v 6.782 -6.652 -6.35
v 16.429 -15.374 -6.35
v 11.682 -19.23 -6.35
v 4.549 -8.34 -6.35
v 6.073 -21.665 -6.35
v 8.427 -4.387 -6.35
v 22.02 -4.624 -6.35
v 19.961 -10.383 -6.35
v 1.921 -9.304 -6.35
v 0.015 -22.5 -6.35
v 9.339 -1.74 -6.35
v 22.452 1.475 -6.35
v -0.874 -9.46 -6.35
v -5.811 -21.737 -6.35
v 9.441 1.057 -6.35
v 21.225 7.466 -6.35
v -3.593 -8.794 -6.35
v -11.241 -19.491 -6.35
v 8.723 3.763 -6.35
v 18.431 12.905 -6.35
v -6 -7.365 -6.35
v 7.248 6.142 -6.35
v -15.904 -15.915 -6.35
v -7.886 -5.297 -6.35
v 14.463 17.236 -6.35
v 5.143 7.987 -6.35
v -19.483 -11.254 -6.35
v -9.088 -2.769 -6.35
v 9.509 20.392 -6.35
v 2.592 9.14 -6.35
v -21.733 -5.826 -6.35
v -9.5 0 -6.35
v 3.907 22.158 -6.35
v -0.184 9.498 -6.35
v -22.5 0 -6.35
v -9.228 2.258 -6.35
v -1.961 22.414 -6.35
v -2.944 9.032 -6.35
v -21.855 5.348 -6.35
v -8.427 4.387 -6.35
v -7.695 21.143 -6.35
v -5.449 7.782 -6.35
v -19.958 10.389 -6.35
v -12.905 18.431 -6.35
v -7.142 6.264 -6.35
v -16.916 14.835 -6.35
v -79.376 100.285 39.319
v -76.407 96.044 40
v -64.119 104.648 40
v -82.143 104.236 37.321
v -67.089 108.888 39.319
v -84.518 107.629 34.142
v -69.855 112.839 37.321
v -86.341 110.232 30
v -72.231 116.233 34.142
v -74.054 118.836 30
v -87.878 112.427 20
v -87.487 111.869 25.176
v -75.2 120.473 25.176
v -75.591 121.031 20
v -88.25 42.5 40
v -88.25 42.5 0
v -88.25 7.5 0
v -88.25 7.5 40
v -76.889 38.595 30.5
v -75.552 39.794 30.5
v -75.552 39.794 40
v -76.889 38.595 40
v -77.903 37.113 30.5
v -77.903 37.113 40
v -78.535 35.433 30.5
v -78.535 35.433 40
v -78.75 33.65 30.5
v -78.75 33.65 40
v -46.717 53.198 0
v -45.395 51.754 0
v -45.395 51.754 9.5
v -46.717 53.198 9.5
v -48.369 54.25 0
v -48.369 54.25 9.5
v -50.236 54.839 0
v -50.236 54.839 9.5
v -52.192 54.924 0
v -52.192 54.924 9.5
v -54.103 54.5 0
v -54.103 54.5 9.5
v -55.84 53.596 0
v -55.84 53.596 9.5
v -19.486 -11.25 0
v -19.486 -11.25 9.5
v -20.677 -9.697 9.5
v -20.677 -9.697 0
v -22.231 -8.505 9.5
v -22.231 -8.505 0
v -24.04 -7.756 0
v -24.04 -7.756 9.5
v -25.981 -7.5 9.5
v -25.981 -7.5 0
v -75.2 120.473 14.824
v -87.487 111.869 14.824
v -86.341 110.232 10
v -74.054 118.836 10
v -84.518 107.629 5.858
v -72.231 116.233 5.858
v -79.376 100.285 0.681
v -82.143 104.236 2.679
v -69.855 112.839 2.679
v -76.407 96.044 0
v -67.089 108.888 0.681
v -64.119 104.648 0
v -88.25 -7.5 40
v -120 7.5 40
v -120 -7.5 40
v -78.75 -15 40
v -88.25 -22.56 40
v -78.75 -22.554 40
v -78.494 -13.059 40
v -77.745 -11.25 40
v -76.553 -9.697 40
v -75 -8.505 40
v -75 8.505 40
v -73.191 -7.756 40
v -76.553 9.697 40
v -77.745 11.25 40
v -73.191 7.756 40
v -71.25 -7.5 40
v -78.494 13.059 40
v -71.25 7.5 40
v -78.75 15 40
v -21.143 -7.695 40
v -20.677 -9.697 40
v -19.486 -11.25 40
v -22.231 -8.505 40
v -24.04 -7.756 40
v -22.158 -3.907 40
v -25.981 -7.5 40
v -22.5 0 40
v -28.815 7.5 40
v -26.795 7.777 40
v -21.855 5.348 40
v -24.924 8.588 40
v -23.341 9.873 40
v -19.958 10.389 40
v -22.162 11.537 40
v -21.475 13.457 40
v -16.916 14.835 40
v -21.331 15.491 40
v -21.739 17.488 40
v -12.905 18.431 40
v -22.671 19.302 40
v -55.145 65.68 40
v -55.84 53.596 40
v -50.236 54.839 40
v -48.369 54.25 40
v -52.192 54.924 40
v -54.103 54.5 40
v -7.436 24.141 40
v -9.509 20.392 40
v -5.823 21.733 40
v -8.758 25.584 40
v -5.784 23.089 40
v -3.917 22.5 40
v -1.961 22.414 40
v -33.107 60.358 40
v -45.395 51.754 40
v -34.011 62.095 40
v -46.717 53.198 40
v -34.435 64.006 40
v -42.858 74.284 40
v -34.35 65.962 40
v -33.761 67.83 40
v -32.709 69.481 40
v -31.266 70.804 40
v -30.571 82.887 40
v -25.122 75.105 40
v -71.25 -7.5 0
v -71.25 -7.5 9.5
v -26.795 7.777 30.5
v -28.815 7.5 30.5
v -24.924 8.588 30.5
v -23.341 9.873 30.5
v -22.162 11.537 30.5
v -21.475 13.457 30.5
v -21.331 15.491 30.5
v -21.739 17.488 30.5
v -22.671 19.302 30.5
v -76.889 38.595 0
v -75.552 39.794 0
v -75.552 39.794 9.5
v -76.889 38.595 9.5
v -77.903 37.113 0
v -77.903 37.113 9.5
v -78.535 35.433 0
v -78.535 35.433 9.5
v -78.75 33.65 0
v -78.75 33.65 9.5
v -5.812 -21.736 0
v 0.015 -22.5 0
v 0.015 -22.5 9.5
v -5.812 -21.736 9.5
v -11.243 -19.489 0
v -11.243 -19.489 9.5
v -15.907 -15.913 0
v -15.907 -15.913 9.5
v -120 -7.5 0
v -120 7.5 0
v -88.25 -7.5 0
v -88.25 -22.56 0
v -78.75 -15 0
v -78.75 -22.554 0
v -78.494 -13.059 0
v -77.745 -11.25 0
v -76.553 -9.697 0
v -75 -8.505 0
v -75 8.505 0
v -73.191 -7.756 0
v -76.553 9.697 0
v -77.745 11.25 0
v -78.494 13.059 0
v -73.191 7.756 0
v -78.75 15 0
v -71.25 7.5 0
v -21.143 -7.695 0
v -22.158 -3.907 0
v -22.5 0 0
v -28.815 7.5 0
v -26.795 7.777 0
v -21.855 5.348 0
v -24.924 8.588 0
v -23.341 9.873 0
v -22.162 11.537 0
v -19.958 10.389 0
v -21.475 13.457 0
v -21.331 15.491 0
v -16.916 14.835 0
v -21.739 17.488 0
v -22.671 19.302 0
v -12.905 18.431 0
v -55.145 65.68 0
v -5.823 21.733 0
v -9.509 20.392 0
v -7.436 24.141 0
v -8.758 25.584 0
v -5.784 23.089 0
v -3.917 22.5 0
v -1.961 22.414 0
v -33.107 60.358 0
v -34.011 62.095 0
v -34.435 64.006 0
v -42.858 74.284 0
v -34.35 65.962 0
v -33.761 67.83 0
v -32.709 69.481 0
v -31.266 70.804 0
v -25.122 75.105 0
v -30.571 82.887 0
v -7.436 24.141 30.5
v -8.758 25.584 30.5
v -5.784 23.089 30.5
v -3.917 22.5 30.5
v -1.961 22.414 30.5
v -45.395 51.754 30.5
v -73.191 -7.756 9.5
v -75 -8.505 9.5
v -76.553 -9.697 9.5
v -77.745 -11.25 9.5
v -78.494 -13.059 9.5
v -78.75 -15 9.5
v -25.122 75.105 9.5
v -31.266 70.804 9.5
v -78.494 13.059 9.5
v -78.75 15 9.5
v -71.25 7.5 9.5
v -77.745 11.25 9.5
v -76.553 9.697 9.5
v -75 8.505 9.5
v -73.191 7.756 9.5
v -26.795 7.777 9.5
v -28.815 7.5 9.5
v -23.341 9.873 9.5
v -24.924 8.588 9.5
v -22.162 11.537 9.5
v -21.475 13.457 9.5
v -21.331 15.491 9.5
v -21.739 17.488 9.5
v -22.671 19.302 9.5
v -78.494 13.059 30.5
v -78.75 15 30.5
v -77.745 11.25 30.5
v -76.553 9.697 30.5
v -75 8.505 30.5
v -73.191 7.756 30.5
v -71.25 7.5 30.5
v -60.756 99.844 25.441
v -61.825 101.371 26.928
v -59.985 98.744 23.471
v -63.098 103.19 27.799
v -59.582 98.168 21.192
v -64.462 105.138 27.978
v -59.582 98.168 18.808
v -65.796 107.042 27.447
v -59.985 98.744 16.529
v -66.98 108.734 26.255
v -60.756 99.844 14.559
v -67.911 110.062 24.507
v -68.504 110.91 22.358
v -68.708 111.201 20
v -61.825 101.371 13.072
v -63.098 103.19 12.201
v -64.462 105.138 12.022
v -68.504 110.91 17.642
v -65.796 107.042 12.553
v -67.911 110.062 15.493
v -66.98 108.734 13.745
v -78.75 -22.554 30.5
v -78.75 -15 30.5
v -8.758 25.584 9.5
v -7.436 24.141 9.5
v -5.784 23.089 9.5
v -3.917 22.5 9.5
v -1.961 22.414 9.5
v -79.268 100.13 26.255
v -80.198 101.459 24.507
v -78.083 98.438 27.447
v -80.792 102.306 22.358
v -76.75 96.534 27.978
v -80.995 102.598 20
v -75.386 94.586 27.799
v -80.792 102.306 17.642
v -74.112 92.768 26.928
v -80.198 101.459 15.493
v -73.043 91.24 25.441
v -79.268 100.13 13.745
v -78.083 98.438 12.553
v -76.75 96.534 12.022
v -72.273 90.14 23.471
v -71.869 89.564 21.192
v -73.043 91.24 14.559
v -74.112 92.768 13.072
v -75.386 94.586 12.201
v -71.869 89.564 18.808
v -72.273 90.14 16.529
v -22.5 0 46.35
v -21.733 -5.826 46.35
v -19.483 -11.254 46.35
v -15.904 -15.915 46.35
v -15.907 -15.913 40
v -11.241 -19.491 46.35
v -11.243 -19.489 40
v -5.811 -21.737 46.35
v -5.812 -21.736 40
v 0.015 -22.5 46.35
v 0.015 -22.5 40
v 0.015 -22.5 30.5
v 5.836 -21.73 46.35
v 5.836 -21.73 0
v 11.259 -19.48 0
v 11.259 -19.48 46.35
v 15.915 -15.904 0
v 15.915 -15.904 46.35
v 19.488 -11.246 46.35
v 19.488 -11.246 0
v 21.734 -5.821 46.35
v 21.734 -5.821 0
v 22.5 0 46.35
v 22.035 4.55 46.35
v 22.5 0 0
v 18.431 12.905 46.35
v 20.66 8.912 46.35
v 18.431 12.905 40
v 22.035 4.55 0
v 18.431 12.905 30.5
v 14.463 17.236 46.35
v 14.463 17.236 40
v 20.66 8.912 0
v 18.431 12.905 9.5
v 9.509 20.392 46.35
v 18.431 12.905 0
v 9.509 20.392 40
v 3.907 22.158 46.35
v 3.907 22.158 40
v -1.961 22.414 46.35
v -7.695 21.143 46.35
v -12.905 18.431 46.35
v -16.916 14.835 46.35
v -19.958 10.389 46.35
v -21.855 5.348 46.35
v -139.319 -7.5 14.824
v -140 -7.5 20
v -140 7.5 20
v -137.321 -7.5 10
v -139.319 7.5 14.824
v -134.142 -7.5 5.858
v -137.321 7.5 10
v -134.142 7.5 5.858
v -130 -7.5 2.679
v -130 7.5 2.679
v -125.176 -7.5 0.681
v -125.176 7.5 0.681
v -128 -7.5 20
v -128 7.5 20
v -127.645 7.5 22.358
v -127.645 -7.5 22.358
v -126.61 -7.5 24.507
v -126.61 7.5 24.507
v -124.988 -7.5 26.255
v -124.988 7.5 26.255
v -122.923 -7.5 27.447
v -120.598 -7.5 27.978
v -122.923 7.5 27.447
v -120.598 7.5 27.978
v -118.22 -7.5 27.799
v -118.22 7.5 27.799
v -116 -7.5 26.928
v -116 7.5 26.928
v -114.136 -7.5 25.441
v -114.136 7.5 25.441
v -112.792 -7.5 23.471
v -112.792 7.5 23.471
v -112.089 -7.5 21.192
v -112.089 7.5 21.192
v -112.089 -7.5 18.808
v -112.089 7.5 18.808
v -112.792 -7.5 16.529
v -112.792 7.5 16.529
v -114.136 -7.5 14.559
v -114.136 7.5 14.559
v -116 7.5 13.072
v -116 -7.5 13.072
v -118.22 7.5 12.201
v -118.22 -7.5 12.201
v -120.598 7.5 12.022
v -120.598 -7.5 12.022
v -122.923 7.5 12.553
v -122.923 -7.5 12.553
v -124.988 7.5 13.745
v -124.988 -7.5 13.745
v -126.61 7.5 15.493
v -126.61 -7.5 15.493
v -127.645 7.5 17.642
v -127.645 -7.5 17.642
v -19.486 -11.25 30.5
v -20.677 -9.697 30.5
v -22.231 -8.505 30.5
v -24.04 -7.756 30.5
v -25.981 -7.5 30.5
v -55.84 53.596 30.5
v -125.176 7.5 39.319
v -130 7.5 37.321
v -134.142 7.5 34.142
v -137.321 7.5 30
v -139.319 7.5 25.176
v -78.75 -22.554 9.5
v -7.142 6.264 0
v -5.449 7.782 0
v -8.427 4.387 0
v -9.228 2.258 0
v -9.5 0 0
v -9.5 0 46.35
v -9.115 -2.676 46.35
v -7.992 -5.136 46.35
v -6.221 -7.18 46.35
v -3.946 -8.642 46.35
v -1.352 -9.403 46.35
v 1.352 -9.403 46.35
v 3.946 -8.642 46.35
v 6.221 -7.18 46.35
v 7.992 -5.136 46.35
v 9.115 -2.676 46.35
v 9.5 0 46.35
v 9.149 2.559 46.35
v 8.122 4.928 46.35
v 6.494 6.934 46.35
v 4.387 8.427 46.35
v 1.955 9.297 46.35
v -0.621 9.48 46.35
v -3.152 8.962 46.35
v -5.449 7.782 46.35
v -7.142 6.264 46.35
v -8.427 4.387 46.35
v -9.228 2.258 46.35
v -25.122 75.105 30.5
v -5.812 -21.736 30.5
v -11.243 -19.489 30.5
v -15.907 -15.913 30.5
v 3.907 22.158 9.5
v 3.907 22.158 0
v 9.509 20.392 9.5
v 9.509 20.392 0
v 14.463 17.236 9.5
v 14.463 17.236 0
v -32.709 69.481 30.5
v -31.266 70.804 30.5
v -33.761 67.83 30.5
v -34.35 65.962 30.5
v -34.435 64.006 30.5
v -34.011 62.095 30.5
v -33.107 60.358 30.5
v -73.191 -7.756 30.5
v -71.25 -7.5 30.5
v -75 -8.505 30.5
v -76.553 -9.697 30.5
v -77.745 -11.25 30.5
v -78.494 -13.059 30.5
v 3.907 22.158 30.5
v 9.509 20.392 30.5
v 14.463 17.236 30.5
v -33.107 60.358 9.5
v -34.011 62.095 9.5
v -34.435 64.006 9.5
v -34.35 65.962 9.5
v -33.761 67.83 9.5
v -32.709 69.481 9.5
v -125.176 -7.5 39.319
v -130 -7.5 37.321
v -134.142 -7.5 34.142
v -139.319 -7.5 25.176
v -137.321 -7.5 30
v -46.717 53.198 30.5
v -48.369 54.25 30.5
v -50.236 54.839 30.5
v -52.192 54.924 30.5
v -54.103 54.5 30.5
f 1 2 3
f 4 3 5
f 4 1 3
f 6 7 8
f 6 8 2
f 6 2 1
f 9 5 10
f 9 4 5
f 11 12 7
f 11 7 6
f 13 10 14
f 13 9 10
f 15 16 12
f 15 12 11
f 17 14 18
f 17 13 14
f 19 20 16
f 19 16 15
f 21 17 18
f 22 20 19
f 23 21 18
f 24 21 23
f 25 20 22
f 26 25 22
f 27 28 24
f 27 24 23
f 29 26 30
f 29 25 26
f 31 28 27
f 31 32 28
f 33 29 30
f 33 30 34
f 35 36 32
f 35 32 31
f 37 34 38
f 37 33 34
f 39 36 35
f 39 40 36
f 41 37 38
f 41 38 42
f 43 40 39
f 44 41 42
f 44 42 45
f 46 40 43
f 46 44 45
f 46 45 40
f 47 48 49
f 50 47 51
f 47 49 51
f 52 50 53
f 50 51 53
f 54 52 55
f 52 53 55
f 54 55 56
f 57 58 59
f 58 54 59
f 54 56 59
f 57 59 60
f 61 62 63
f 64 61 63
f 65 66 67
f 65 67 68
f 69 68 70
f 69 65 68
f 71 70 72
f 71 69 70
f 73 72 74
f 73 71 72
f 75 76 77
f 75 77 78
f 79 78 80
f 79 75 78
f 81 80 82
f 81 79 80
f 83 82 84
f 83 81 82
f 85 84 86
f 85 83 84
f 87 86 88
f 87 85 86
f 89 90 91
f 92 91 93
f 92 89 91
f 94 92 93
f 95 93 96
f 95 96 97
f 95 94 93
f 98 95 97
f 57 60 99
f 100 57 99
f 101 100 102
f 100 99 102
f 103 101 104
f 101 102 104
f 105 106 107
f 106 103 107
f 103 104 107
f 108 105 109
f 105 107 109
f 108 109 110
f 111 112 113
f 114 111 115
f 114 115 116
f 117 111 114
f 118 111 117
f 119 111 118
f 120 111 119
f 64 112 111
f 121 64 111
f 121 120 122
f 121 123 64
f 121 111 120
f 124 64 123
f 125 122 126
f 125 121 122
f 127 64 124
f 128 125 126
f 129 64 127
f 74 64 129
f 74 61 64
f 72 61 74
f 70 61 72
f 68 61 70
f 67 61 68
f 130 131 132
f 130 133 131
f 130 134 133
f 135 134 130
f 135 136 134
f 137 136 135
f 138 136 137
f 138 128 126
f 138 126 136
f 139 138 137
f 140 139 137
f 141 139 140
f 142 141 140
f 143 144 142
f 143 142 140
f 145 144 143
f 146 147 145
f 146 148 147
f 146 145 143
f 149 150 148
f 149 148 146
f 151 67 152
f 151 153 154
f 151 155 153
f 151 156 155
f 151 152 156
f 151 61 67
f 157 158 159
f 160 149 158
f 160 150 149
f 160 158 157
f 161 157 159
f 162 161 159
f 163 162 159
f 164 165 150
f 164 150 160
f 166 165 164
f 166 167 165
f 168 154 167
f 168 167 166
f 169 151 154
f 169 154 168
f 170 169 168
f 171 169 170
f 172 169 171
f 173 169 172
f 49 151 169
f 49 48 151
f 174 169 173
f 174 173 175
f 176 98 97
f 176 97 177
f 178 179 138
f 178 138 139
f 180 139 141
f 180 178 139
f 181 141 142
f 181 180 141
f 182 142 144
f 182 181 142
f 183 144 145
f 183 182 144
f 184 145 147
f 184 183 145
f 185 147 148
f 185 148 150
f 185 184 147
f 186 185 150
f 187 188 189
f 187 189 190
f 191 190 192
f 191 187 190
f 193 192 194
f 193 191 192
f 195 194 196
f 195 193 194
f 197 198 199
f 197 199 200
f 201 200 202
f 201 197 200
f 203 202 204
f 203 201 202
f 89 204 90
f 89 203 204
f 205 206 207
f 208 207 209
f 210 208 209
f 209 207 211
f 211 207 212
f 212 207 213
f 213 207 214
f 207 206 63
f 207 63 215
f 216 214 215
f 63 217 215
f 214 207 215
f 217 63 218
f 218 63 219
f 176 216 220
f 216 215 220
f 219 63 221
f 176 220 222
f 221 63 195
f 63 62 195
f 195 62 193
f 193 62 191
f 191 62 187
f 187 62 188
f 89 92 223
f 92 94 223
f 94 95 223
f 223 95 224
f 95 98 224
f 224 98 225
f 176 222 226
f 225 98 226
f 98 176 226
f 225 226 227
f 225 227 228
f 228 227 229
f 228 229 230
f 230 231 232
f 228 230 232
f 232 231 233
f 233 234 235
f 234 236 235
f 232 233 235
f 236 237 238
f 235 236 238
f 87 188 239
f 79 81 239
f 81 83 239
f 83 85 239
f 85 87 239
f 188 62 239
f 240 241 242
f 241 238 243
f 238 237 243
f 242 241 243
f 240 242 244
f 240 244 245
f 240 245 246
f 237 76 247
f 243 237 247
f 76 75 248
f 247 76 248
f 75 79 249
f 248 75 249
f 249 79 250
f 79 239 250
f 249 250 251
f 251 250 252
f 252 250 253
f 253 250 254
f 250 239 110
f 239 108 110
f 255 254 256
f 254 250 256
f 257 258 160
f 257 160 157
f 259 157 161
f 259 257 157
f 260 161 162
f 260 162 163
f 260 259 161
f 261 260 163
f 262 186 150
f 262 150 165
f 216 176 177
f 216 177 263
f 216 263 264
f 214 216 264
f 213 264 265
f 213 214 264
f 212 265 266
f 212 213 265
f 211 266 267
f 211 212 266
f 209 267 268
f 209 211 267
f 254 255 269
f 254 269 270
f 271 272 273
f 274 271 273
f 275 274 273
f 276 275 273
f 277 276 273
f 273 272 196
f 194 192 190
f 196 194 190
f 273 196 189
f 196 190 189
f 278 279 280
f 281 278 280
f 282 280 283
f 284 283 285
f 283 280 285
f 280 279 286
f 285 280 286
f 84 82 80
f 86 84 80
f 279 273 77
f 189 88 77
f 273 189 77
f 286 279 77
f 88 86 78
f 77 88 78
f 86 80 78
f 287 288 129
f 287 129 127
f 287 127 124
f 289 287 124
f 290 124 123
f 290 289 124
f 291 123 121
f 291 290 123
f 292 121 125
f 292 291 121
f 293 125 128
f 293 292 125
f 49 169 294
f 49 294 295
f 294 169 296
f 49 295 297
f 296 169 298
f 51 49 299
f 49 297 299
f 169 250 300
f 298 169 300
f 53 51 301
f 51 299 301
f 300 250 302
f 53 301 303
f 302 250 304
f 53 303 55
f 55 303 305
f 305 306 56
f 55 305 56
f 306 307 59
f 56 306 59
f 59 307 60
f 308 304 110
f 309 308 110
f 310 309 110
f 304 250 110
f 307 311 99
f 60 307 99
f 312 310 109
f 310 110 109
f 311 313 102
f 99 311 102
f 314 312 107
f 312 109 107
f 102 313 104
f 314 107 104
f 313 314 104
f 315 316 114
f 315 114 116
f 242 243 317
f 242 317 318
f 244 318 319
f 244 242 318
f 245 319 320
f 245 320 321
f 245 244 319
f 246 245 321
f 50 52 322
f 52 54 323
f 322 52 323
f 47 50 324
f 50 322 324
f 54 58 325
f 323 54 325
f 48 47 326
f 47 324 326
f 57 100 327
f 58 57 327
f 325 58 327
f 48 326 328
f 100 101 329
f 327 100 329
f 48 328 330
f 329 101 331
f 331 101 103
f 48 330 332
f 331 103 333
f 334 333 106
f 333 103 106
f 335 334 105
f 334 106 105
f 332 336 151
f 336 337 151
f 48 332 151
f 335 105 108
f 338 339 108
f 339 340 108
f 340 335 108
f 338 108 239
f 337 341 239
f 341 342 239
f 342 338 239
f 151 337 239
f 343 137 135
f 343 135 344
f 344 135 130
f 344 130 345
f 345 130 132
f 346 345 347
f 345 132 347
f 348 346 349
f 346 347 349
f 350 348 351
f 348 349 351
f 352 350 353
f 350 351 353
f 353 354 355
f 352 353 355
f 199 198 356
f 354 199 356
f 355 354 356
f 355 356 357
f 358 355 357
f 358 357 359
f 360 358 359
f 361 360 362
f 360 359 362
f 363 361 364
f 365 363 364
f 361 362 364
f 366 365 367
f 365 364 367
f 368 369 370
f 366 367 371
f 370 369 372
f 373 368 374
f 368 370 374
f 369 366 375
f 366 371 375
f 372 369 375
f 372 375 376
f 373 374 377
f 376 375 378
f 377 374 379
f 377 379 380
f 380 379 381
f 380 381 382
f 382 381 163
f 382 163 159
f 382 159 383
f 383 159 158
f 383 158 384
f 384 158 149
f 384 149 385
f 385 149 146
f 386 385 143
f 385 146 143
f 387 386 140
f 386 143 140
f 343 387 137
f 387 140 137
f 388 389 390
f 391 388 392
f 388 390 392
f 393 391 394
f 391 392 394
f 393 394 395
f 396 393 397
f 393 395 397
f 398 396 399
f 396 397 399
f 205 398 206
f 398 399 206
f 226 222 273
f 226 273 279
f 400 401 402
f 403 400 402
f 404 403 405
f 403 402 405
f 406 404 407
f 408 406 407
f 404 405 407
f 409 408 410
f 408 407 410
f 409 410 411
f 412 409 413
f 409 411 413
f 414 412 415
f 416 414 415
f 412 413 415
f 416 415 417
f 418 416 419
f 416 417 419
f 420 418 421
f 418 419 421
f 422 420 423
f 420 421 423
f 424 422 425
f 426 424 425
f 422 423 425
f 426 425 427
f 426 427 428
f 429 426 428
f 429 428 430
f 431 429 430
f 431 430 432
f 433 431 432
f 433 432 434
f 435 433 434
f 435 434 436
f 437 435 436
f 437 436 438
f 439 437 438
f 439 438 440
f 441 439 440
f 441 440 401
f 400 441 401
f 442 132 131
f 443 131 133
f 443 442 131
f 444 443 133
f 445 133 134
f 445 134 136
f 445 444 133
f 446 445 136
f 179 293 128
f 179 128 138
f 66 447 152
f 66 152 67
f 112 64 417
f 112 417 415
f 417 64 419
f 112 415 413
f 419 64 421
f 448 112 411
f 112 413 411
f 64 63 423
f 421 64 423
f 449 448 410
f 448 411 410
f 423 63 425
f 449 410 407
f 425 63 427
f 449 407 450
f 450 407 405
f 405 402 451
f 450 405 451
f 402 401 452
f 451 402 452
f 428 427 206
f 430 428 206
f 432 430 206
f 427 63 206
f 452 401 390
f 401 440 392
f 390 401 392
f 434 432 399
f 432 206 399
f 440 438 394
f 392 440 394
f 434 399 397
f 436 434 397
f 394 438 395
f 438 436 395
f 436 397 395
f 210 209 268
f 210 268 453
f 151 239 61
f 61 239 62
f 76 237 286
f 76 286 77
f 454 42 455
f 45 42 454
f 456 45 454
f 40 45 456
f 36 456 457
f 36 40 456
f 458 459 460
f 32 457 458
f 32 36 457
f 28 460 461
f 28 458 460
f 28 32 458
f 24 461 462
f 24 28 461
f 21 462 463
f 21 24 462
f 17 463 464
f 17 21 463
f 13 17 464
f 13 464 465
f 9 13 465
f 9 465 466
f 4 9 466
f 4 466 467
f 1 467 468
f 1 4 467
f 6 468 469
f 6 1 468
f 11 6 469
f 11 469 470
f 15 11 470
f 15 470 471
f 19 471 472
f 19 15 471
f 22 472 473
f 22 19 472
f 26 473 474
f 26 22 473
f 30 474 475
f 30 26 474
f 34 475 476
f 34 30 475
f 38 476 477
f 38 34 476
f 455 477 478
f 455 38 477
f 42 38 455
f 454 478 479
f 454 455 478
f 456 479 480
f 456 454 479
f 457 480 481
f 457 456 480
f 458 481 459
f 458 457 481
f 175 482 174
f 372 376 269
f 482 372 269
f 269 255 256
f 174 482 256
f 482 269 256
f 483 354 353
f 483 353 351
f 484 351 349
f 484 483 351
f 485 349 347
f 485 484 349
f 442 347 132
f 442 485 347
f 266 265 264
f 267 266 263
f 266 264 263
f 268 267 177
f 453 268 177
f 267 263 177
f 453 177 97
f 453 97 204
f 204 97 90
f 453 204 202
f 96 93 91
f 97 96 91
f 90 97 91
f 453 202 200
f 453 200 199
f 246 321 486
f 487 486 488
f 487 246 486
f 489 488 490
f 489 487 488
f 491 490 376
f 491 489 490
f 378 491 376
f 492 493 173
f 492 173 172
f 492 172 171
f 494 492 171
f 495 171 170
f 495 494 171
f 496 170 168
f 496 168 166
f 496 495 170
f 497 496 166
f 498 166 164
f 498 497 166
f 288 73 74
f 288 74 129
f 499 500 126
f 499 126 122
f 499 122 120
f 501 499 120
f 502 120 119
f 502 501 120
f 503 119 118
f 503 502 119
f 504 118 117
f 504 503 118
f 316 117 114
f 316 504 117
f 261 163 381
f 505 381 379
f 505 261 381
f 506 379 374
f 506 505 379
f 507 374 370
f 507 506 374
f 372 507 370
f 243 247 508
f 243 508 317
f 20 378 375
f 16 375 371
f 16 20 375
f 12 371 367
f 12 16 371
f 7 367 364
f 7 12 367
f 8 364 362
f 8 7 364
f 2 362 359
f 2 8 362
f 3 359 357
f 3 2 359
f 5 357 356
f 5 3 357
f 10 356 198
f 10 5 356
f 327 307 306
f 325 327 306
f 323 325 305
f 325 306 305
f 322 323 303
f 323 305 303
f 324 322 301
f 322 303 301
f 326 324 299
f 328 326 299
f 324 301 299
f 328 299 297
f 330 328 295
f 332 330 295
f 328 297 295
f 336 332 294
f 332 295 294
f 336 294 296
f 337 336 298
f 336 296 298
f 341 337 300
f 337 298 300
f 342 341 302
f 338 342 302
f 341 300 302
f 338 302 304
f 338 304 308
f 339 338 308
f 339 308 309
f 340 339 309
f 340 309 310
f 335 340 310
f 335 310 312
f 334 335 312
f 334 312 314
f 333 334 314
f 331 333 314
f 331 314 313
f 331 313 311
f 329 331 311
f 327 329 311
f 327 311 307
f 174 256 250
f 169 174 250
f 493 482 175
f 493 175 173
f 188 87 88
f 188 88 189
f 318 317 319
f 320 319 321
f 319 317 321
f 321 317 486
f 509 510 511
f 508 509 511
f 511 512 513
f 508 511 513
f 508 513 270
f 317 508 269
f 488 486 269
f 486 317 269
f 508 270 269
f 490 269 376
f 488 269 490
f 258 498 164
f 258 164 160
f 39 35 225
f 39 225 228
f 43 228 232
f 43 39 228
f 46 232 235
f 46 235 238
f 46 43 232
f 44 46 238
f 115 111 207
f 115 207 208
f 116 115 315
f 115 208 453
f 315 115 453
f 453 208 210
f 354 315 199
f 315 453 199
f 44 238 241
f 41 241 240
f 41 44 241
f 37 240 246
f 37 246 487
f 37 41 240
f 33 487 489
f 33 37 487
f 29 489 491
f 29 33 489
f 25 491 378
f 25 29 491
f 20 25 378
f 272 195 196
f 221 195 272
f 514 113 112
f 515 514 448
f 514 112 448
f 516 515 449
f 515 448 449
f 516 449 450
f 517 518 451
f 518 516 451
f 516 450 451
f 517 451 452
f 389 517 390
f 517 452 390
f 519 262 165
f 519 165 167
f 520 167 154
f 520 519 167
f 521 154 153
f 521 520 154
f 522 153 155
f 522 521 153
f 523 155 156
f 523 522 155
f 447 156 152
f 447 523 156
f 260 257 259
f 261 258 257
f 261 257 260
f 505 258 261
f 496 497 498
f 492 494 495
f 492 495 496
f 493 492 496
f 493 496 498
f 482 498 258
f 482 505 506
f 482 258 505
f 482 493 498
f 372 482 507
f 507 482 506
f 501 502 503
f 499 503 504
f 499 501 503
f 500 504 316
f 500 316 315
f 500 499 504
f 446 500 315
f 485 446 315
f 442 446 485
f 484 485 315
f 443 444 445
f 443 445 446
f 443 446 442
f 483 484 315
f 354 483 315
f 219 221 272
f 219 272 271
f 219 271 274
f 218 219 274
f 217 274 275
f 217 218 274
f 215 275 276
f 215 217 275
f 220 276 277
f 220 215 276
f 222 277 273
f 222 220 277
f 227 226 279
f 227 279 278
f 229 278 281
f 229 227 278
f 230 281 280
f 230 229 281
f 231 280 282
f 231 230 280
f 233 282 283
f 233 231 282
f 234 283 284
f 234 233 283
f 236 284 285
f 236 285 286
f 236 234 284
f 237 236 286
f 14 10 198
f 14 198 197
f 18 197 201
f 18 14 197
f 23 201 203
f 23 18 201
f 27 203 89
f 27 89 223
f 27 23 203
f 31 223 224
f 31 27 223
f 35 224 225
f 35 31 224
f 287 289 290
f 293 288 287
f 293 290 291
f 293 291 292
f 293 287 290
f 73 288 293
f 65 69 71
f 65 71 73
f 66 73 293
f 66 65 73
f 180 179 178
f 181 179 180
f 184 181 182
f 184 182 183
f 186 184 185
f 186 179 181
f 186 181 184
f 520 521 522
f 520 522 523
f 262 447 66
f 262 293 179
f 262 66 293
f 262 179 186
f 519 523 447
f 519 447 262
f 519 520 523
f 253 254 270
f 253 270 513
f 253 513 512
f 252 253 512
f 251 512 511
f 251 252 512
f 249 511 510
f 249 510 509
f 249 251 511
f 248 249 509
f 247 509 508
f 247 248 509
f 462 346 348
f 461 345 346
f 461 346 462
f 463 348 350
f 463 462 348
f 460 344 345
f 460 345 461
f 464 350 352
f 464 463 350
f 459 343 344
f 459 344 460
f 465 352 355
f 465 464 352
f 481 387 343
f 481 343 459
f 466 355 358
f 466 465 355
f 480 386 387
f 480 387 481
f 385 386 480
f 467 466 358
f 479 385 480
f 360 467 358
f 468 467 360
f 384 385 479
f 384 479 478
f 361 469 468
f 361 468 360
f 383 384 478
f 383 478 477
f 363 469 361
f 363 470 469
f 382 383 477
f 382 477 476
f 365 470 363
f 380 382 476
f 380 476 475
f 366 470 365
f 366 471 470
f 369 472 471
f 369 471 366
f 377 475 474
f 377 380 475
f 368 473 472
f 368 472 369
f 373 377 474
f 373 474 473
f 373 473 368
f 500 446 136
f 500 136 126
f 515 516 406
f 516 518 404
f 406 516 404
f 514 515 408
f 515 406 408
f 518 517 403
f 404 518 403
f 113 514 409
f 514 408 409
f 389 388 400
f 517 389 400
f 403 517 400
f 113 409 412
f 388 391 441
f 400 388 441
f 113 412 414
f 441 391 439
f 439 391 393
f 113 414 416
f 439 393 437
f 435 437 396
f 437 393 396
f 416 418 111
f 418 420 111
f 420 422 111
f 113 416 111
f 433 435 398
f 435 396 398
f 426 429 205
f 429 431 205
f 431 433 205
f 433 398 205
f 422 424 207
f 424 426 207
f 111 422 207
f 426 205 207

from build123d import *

# Parameters (mm, degrees)
BOSS_EXTRU_1_DEPTH      = 40
ESQUISSE2_R             = 8
ENL_V_MAT_EXTRU_1_DEPTH = 192.268559563
ESQUISSE3_R             = 8
ENL_V_MAT_EXTRU_2_DEPTH = 185.632839971
BOSS_EXTRU_2_DEPTH      = 6.35
BOSS_EXTRU_3_START      = 6.35
BOSS_EXTRU_3_DEPTH      = 6.35
ENL_V_START             = -9.5
ENL_V_MAT_EXTRU_3_DEPTH = 9.5
ENL_V_MAT_EXTRU_4_DEPTH = 9.5


with BuildPart() as part:
    # Esquisse1 → Boss.-Extru.1 (new body)
    with BuildSketch(Plane.XY):
        with BuildLine():
            ThreePointArc((-12.905469818, 18.430920997), (3.907083998, 22.158174443), (18.430920997, 12.905469818))
            Line((18.430920997, 12.905469818), (-30.570908371, 82.887334756))
            Line((-30.570908371, 82.887334756), (-42.858189035, 74.28368821))
            Line((-42.858189035, 74.28368821), (-75.591001848, 121.030989584))
            Line((-75.591001848, 121.030989584), (-81.73464218, 116.729166311))
            Line((-81.73464218, 116.729166311), (-12.905469818, 18.430920997))
        make_face()
        with BuildLine():
            ThreePointArc((-22.5, 0), (-19.957743747, 10.389343798), (-12.905469818, 18.430920997))
            Line((-12.905469818, 18.430920997), (-81.73464218, 116.729166311))
            Line((-81.73464218, 116.729166311), (-87.878282512, 112.427343039))
            Line((-87.878282512, 112.427343039), (-55.1454697, 65.680041665))
            Line((-55.1454697, 65.680041665), (-88.25, 42.5))
            Line((-88.25, 42.5), (-88.25, 7.5))
            Line((-88.25, 7.5), (-140, 7.5))
            Line((-140, 7.5), (-140, 0))
            Line((-140, 0), (-22.5, 0))
        make_face()
        with BuildLine():
            Line((-88.25, -22.560492565), (0.015421683, -22.499994715))
            ThreePointArc((0.015421683, -22.499994715), (-15.904449254, -15.915354031), (-22.5, 0))
            Line((-22.5, 0), (-140, 0))
            Line((-140, 0), (-140, -7.5))
            Line((-140, -7.5), (-88.25, -7.5))
            Line((-88.25, -7.5), (-88.25, -22.560492565))
        make_face()
        with BuildLine():
            ThreePointArc((22.5, 0), (21.458631392, 6.765880489), (18.430920997, 12.905469818))
            ThreePointArc((18.430920997, 12.905469818), (3.907083998, 22.158174443), (-12.905469818, 18.430920997))
            Line((-12.905469818, 18.430920997), (-5.448976145, 7.781944421))
            ThreePointArc((-5.448976145, 7.781944421), (4.386611826, 8.426602915), (9.5, 0))
            ThreePointArc((9.5, 0), (0, -9.5), (-9.5, 0))
            Line((-9.5, 0), (-22.5, 0))
            ThreePointArc((-22.5, 0), (-15.904449254, -15.915354031), (0.015421683, -22.499994715))
            ThreePointArc((0.015421683, -22.499994715), (15.915354031, -15.904449254), (22.5, 0))
        make_face()
        with BuildLine():
            Line((-5.448976145, 7.781944421), (-12.905469818, 18.430920997))
            ThreePointArc((-12.905469818, 18.430920997), (-19.957743747, 10.389343798), (-22.5, 0))
            Line((-22.5, 0), (-9.5, 0))
            ThreePointArc((-9.5, 0), (-8.426602915, 4.386611826), (-5.448976145, 7.781944421))
        make_face()
        with BuildLine():
            ThreePointArc((22.5, 0), (21.458631392, 6.765880489), (18.430920997, 12.905469818))
            ThreePointArc((18.430920997, 12.905469818), (3.907083998, 22.158174443), (-12.905469818, 18.430920997))
            Line((-12.905469818, 18.430920997), (-5.448976145, 7.781944421))
            ThreePointArc((-5.448976145, 7.781944421), (4.386611826, 8.426602915), (9.5, 0))
            ThreePointArc((9.5, 0), (0, -9.5), (-9.5, 0))
            Line((-9.5, 0), (-22.5, 0))
            ThreePointArc((-22.5, 0), (-15.904449254, -15.915354031), (0.015421683, -22.499994715))
            ThreePointArc((0.015421683, -22.499994715), (15.915354031, -15.904449254), (22.5, 0))
        make_face()
        with BuildLine():
            Line((-5.448976145, 7.781944421), (-12.905469818, 18.430920997))
            ThreePointArc((-12.905469818, 18.430920997), (-19.957743747, 10.389343798), (-22.5, 0))
            Line((-22.5, 0), (-9.5, 0))
            ThreePointArc((-9.5, 0), (-8.426602915, 4.386611826), (-5.448976145, 7.781944421))
        make_face()
    extrude(amount=BOSS_EXTRU_1_DEPTH)

    # Esquisse2 → Enlèv. mat.-Extru.1 (cut, through all)
    with BuildSketch(Plane(origin=(6.143640332, 4.301823273, 0), x_dir=(0, 0, -1), z_dir=(0.8191520442889931, 0.5735764363510444, 0))):
        with Locations(Location((-20, 122.5, 0), (0, 0, 90))):
            Circle(ESQUISSE2_R)
        with BuildLine():
            ThreePointArc((-40, 122.5), (-34.142135624, 136.642135624), (-20, 142.5))
            Line((-20, 142.5), (-40, 142.5))
            Line((-40, 142.5), (-40, 122.5))
        make_face()
        with BuildLine():
            ThreePointArc((-20, 142.5), (-5.857864376, 136.642135624), (0, 122.5))
            Line((0, 122.5), (0, 142.5))
            Line((0, 142.5), (-20, 142.5))
        make_face()
    extrude(amount=-ENL_V_MAT_EXTRU_1_DEPTH, mode=Mode.SUBTRACT)

    # Esquisse3 → Enlèv. mat.-Extru.2 (cut, through all)
    with BuildSketch(Plane(origin=(0, 7.5, 0), x_dir=(1, 0, 0), z_dir=(0, 1, 0))):
        with BuildLine():
            ThreePointArc((-140, -20), (-134.142135624, -5.857864376), (-120, 0))
            Line((-120, 0), (-140, 0))
            Line((-140, 0), (-140, -20))
        make_face()
        with BuildLine():
            ThreePointArc((-120, -40), (-134.142135624, -34.142135624), (-140, -20))
            Line((-140, -20), (-140, -40))
            Line((-140, -40), (-120, -40))
        make_face()
        with Locations(Location((-120, -20, 0), (0, 0, 180))):
            Circle(ESQUISSE3_R)
    extrude(amount=-ENL_V_MAT_EXTRU_2_DEPTH, mode=Mode.SUBTRACT)

    # Esquisse4 → Boss.-Extru.2 (add)
    with BuildSketch(Plane.XY.offset(40)):
        with BuildLine():
            ThreePointArc((22.5, 0), (21.458631392, 6.765880489), (18.430920997, 12.905469818))
            ThreePointArc((18.430920997, 12.905469818), (3.907083998, 22.158174443), (-12.905469818, 18.430920997))
            Line((-12.905469818, 18.430920997), (-5.448976145, 7.781944421))
            ThreePointArc((-5.448976145, 7.781944421), (4.386611826, 8.426602915), (9.5, 0))
            ThreePointArc((9.5, 0), (0, -9.5), (-9.5, 0))
            Line((-9.5, 0), (-22.5, 0))
            ThreePointArc((-22.5, 0), (-15.904449254, -15.915354031), (0.015421683, -22.499994715))
            ThreePointArc((0.015421683, -22.499994715), (15.915354031, -15.904449254), (22.5, 0))
        make_face()
        with BuildLine():
            ThreePointArc((22.5, 0), (21.458631392, 6.765880489), (18.430920997, 12.905469818))
            ThreePointArc((18.430920997, 12.905469818), (3.907083998, 22.158174443), (-12.905469818, 18.430920997))
            Line((-12.905469818, 18.430920997), (-5.448976145, 7.781944421))
            ThreePointArc((-5.448976145, 7.781944421), (4.386611826, 8.426602915), (9.5, 0))
            ThreePointArc((9.5, 0), (0, -9.5), (-9.5, 0))
            Line((-9.5, 0), (-22.5, 0))
            ThreePointArc((-22.5, 0), (-15.904449254, -15.915354031), (0.015421683, -22.499994715))
            ThreePointArc((0.015421683, -22.499994715), (15.915354031, -15.904449254), (22.5, 0))
        make_face()
        with BuildLine():
            Line((-5.448976145, 7.781944421), (-12.905469818, 18.430920997))
            ThreePointArc((-12.905469818, 18.430920997), (-19.957743747, 10.389343798), (-22.5, 0))
            Line((-22.5, 0), (-9.5, 0))
            ThreePointArc((-9.5, 0), (-8.426602915, 4.386611826), (-5.448976145, 7.781944421))
        make_face()
    extrude(amount=BOSS_EXTRU_2_DEPTH)

    # Esquisse5 → Boss.-Extru.3 (add)
    with BuildSketch(Plane(origin=(0, 0, 0), x_dir=(-1, 0, 0), z_dir=(0, 0, -1)).offset(BOSS_EXTRU_3_START)):
        with BuildLine():
            ThreePointArc((12.905469818, 18.430920997), (-3.907083998, 22.158174443), (-18.430920997, 12.905469818))
            ThreePointArc((-18.430920997, 12.905469818), (-19.961303045, -10.382503588), (-0.015421683, -22.499994715))
            ThreePointArc((-0.015421683, -22.499994715), (15.904449254, -15.915354031), (22.5, 0))
            Line((22.5, 0), (9.5, 0))
            ThreePointArc((9.5, 0), (-8.426602915, -4.386611826), (5.448976145, 7.781944421))
            Line((5.448976145, 7.781944421), (12.905469818, 18.430920997))
        make_face()
        with BuildLine():
            ThreePointArc((22.5, 0), (19.957743747, 10.389343798), (12.905469818, 18.430920997))
            Line((12.905469818, 18.430920997), (5.448976145, 7.781944421))
            ThreePointArc((5.448976145, 7.781944421), (8.426602915, 4.386611826), (9.5, 0))
            Line((9.5, 0), (22.5, 0))
        make_face()
        with BuildLine():
            ThreePointArc((12.905469818, 18.430920997), (-3.907083998, 22.158174443), (-18.430920997, 12.905469818))
            ThreePointArc((-18.430920997, 12.905469818), (-19.961303045, -10.382503588), (-0.015421683, -22.499994715))
            ThreePointArc((-0.015421683, -22.499994715), (15.904449254, -15.915354031), (22.5, 0))
            Line((22.5, 0), (9.5, 0))
            ThreePointArc((9.5, 0), (-8.426602915, -4.386611826), (5.448976145, 7.781944421))
            Line((5.448976145, 7.781944421), (12.905469818, 18.430920997))
        make_face()
    extrude(amount=-BOSS_EXTRU_3_DEPTH)

    # Esquisse6 → Enlèv. mat.-Extru.3 (cut)
    with BuildSketch(Plane.XY.offset(40).offset(ENL_V_START)):
        with BuildLine():
            Line((18.430920997, 12.905469818), (-25.121932226, 75.105390335))
            Line((-25.121932226, 75.105390335), (-31.265572558, 70.803567062))
            ThreePointArc((-31.265572558, 70.803567062), (-34.349807433, 65.962288063), (-33.107389617, 60.358103458))
            Line((-33.107389617, 60.358103458), (-8.758312615, 25.58401767))
            ThreePointArc((-8.758312615, 25.58401767), (-5.784309245, 23.08853254), (-1.961004212, 22.414380707))
            ThreePointArc((-1.961004212, 22.414380707), (9.508910889, 20.391925208), (18.430920997, 12.905469818))
        make_face()
        with BuildLine():
            Line((-78.75, -22.553981187), (0.015421683, -22.499994715))
            ThreePointArc((0.015421683, -22.499994715), (-11.243321555, -19.489425862), (-19.485571585, -11.25))
            ThreePointArc((-19.485571585, -11.25), (-22.230762114, -8.504809472), (-25.980762114, -7.5))
            Line((-25.980762114, -7.5), (-71.25, -7.5))
            ThreePointArc((-71.25, -7.5), (-76.553300859, -9.696699141), (-78.75, -15))
            Line((-78.75, -15), (-78.75, -22.553981187))
        make_face()
        with BuildLine():
            Line((-22.671091572, 19.301823273), (-45.394670282, 51.754456912))
            ThreePointArc((-45.394670282, 51.754456912), (-50.235949281, 54.838691787), (-55.840133886, 53.596273972))
            Line((-55.840133886, 53.596273972), (-75.551823273, 39.794000473))
            ThreePointArc((-75.551823273, 39.794000473), (-77.902581249, 37.11347474), (-78.75, 33.650360141))
            Line((-78.75, 33.650360141), (-78.75, 15))
            ThreePointArc((-78.75, 15), (-76.553300859, 9.696699141), (-71.25, 7.5))
            Line((-71.25, 7.5), (-28.814731905, 7.5))
            ThreePointArc((-28.814731905, 7.5), (-22.162150656, 11.536885401), (-22.671091572, 19.301823273))
        make_face()
    extrude(amount=ENL_V_MAT_EXTRU_3_DEPTH, mode=Mode.SUBTRACT)

    # Esquisse7 → Enlèv. mat.-Extru.4 (cut)
    with BuildSketch(Plane(origin=(0, 0, 0), x_dir=(-1, 0, 0), z_dir=(0, 0, -1))):
        with BuildLine():
            Line((25.980762114, -7.5), (71.25, -7.5))
            ThreePointArc((71.25, -7.5), (76.553300859, -9.696699141), (78.75, -15))
            Line((78.75, -15), (78.75, -22.553981187))
            Line((78.75, -22.553981187), (-0.015421683, -22.499994715))
            ThreePointArc((-0.015421683, -22.499994715), (11.243321555, -19.489425862), (19.485571585, -11.25))
            ThreePointArc((19.485571585, -11.25), (22.230762114, -8.504809472), (25.980762114, -7.5))
        make_face()
        with BuildLine():
            Line((33.107389617, 60.358103458), (8.758312615, 25.58401767))
            ThreePointArc((8.758312615, 25.58401767), (5.784309245, 23.08853254), (1.961004212, 22.414380707))
            ThreePointArc((1.961004212, 22.414380707), (-9.508910889, 20.391925208), (-18.430920997, 12.905469818))
            Line((-18.430920997, 12.905469818), (25.121932226, 75.105390335))
            Line((25.121932226, 75.105390335), (31.265572558, 70.803567062))
            ThreePointArc((31.265572558, 70.803567062), (34.349807433, 65.962288063), (33.107389617, 60.358103458))
        make_face()
        with BuildLine():
            Line((78.75, 33.650360141), (78.75, 15))
            ThreePointArc((78.75, 15), (76.553300859, 9.696699141), (71.25, 7.5))
            Line((71.25, 7.5), (28.814731905, 7.5))
            ThreePointArc((28.814731905, 7.5), (22.162150656, 11.536885401), (22.671091572, 19.301823273))
            Line((22.671091572, 19.301823273), (45.394670282, 51.754456912))
            ThreePointArc((45.394670282, 51.754456912), (50.235949281, 54.838691787), (55.840133886, 53.596273972))
            Line((55.840133886, 53.596273972), (75.551823273, 39.794000473))
            ThreePointArc((75.551823273, 39.794000473), (77.902581249, 37.11347474), (78.75, 33.650360141))
        make_face()
    extrude(amount=-ENL_V_MAT_EXTRU_4_DEPTH, mode=Mode.SUBTRACT)


solid = part.part
